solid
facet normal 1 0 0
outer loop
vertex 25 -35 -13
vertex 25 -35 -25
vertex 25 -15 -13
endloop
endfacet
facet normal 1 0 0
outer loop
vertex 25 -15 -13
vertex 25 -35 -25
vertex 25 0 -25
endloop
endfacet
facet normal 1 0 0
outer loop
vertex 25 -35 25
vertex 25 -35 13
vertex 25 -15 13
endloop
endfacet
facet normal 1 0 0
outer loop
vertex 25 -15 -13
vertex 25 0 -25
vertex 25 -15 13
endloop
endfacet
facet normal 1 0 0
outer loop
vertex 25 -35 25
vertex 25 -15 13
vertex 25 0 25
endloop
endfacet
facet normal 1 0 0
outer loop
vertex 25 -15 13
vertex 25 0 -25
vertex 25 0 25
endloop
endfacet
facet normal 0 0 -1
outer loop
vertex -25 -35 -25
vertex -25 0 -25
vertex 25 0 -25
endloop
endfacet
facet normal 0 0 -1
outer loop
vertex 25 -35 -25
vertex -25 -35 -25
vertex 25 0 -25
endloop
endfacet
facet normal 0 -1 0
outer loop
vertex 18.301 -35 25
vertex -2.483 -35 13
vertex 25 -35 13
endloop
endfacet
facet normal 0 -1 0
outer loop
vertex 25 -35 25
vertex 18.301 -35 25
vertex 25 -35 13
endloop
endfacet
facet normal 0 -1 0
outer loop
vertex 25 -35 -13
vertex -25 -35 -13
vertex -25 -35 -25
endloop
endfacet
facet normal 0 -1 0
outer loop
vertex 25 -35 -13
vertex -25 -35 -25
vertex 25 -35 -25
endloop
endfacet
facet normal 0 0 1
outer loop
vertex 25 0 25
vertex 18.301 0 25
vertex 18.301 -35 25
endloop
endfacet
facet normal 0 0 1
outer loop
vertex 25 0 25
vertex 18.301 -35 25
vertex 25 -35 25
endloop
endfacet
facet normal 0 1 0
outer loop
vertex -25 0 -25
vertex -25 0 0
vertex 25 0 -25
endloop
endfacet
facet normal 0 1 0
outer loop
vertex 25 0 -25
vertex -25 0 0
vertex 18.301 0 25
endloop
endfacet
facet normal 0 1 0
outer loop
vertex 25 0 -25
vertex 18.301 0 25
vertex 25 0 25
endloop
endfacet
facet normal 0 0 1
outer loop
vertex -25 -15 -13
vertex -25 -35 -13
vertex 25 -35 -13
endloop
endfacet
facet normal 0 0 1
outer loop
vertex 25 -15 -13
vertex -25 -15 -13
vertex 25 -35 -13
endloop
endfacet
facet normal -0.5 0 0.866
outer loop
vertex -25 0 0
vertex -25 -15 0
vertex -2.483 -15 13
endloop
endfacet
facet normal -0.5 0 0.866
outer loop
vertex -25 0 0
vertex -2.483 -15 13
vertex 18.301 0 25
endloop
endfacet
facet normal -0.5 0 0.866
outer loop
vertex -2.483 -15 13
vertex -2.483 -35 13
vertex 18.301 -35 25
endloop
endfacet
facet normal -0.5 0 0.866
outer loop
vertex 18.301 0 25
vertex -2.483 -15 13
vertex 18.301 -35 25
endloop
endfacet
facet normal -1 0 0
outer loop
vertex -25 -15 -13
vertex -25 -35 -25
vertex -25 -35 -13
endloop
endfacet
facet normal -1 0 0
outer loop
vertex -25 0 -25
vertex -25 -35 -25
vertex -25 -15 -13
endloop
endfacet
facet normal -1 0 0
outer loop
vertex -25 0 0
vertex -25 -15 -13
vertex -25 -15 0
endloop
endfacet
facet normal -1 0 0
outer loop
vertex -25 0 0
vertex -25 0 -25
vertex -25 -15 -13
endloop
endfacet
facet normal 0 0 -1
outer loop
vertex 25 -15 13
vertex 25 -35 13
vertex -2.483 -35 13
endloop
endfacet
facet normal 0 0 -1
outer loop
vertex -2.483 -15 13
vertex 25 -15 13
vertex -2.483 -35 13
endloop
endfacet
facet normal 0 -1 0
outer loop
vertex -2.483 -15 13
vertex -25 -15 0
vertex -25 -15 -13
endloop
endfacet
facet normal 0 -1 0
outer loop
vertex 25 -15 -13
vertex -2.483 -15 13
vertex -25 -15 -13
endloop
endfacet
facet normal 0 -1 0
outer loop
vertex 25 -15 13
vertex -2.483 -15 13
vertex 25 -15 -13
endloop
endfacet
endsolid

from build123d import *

# Parameters (mm, degrees)
F0_W     = 50
F0_H     = 50
F1_DEPTH = 35
F3_DEPTH = 35.001
F5_DEPTH = 20


with BuildPart() as f1:
    # F0 (on Front) → F1 (new body)
    with BuildSketch(Plane.XZ):
        Rectangle(F0_W, F0_H)
    extrude(amount=F1_DEPTH)

    # F2 (on face) → F3 (cut, through all)
    with BuildSketch(Plane.XZ.offset(35)):
        Polygon((-25, 0), (18.30127, 25), (-25, 25), align=None)
    extrude(amount=-F3_DEPTH, mode=Mode.SUBTRACT)

    # F4 (on face) → F5 (cut)
    with BuildSketch(Plane.XZ.offset(35)):
        Polygon((-25, 0), (-25, -13), (25, -13), (25, 13), (-2.48334, 13), align=None)
    extrude(amount=-F5_DEPTH, mode=Mode.SUBTRACT)


solid = f1.part
